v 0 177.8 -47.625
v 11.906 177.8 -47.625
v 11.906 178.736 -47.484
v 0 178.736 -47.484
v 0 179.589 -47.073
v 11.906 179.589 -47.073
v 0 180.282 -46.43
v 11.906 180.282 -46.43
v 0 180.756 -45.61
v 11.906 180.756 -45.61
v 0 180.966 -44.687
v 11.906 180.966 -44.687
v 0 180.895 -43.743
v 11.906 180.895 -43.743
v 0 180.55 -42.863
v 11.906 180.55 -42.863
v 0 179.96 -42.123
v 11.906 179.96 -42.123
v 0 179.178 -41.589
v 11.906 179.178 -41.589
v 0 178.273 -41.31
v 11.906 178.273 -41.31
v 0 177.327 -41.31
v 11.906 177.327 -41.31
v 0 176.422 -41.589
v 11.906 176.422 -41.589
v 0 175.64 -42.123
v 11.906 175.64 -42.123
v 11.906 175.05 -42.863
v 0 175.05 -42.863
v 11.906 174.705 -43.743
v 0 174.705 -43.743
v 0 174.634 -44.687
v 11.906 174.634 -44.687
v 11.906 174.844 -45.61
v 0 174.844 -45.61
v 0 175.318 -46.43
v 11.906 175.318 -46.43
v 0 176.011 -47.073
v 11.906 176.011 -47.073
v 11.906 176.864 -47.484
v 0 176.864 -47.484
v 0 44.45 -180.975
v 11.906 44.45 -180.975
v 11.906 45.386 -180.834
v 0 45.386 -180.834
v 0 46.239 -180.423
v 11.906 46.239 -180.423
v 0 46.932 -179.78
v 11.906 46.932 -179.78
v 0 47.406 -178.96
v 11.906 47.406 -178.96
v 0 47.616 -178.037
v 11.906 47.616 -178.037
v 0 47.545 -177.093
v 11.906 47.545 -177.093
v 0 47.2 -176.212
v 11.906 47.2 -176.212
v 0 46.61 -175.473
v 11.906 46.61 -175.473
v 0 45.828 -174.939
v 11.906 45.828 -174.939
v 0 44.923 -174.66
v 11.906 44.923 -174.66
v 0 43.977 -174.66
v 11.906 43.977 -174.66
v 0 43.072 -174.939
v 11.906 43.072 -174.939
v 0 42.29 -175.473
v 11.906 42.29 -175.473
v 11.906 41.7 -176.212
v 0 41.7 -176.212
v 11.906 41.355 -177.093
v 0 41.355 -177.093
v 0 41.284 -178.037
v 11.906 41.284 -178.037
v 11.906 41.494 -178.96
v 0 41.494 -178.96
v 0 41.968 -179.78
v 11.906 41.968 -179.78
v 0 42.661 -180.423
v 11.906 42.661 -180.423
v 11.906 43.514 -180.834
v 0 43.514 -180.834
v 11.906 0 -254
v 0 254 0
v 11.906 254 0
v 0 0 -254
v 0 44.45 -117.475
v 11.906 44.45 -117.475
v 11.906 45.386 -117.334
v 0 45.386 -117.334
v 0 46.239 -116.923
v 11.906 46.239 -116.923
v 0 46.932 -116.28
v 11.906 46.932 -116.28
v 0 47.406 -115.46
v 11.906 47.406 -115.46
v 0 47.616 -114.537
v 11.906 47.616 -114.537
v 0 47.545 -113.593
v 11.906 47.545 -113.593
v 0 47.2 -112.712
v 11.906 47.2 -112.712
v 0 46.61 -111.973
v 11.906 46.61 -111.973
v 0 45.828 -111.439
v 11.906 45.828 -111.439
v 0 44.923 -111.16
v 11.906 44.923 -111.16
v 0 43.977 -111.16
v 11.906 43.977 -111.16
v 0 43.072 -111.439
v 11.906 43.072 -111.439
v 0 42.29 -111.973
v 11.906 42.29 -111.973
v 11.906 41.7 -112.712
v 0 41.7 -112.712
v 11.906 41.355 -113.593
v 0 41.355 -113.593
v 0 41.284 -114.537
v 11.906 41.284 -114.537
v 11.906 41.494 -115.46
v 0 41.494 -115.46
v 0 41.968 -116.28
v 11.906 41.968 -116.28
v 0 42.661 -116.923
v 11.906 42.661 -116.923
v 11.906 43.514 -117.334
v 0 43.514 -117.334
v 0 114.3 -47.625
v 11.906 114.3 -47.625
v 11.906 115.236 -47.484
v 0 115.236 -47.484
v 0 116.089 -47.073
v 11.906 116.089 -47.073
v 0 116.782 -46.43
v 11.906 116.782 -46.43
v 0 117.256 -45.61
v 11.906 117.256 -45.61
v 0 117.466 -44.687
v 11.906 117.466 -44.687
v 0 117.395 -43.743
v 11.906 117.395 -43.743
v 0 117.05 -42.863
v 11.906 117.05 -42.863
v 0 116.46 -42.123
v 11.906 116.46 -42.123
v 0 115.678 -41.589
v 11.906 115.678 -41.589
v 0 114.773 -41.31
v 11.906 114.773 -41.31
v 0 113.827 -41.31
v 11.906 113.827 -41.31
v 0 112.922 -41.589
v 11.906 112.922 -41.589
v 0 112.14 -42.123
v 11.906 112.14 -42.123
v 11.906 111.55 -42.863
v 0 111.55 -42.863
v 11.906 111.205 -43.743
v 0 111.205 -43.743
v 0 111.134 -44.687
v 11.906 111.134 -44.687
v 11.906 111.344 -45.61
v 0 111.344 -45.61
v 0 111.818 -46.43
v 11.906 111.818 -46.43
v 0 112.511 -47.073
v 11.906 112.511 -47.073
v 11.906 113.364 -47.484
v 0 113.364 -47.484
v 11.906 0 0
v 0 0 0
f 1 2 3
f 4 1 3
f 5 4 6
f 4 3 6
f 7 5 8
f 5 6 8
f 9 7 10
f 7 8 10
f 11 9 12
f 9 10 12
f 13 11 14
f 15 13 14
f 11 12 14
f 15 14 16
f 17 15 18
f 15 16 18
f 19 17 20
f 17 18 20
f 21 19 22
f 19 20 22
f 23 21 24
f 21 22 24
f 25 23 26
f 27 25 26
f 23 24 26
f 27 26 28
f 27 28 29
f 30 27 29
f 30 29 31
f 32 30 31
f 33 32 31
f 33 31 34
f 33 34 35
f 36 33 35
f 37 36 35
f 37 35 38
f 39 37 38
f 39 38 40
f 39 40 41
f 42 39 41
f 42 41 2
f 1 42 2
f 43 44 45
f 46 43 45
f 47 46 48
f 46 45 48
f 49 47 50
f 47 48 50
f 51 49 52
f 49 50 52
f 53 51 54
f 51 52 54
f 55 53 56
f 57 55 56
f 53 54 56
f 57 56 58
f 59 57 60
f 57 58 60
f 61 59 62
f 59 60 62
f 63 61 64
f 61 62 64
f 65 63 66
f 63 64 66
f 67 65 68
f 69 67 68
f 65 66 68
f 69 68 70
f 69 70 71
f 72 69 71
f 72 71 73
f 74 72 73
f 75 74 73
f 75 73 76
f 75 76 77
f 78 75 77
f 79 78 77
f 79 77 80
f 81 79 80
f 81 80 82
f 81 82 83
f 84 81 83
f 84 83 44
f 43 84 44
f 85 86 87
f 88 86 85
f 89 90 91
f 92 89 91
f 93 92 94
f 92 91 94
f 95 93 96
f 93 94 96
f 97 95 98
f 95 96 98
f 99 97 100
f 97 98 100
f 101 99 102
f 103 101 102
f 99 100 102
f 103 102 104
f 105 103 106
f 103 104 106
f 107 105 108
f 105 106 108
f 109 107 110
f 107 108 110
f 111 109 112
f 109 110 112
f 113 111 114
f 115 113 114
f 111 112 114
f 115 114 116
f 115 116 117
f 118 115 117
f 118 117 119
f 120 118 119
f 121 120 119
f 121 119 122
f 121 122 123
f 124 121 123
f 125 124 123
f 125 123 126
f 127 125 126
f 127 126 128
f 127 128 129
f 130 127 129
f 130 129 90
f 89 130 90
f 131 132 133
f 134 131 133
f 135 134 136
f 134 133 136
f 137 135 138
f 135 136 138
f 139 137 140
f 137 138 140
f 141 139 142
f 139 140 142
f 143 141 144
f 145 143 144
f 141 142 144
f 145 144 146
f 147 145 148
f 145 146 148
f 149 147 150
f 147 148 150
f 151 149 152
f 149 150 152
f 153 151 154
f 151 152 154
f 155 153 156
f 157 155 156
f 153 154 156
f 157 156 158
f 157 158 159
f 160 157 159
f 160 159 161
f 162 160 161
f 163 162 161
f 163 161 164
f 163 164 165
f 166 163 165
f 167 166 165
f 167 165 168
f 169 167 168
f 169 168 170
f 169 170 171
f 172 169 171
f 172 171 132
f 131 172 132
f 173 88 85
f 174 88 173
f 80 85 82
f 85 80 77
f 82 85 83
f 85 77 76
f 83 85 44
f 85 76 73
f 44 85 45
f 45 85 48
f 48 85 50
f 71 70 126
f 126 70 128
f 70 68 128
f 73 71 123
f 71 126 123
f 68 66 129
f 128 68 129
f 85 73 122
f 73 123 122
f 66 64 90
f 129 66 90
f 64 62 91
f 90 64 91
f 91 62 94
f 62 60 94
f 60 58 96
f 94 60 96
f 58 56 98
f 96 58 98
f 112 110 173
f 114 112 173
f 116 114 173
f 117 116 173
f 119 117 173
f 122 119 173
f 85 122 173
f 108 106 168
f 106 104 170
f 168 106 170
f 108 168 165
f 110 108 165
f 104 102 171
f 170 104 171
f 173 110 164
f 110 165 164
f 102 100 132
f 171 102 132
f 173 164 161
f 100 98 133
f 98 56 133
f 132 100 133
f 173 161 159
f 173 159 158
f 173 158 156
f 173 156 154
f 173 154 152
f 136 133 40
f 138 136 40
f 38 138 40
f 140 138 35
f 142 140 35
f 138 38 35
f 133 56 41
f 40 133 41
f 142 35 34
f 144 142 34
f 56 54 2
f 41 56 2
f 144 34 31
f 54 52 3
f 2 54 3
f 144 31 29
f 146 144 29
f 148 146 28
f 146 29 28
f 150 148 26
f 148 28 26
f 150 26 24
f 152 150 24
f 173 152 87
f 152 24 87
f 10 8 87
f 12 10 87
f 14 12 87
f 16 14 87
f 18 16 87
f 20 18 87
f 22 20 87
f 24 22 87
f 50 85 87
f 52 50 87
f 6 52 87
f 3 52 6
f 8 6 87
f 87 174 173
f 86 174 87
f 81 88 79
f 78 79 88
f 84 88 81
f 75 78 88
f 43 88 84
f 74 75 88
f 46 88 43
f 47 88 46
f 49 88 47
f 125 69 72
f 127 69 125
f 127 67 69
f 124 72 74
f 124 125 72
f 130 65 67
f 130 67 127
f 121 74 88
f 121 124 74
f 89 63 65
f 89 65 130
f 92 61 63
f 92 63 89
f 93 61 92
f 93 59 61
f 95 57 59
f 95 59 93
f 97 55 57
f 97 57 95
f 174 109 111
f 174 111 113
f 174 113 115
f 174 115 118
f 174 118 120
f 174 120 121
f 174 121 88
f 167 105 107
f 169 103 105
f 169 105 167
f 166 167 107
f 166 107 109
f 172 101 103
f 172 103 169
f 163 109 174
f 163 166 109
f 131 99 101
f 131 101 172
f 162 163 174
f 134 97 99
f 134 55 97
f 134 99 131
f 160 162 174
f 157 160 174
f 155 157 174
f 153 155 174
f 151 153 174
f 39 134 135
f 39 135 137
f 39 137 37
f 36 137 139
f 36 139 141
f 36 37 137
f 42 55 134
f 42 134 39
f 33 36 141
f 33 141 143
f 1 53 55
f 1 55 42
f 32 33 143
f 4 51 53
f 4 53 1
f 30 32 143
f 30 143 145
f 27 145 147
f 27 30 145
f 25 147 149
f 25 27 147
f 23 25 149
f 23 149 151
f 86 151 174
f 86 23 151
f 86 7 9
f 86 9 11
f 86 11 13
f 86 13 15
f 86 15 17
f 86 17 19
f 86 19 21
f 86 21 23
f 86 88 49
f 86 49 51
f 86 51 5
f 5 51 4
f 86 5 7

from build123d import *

# Parameters (mm, degrees)
BOSS_EXTRUDE1_DEPTH         = 11.90625
F_1_4_0_25_DIAMETER_HOLE1_D = 6.35


with BuildPart() as part:
    # Sketch1 → Boss-Extrude1 (new body)
    with BuildSketch(Plane(origin=(0, 0, 0), x_dir=(0, 0, -1), z_dir=(1, 0, 0))):
        Polygon((0, 0), (0, 254), (254, 0), align=None)
    extrude(amount=BOSS_EXTRUDE1_DEPTH)

    # 1/4 (0.25) Diameter Hole1 (through all)
    with Locations(Plane.ZY):
        with Locations((-114.3, 44.45), (-44.45, 114.3), (-44.45, 177.8), (-177.8, 44.45)):
            Hole(F_1_4_0_25_DIAMETER_HOLE1_D / 2)


solid = part.part
